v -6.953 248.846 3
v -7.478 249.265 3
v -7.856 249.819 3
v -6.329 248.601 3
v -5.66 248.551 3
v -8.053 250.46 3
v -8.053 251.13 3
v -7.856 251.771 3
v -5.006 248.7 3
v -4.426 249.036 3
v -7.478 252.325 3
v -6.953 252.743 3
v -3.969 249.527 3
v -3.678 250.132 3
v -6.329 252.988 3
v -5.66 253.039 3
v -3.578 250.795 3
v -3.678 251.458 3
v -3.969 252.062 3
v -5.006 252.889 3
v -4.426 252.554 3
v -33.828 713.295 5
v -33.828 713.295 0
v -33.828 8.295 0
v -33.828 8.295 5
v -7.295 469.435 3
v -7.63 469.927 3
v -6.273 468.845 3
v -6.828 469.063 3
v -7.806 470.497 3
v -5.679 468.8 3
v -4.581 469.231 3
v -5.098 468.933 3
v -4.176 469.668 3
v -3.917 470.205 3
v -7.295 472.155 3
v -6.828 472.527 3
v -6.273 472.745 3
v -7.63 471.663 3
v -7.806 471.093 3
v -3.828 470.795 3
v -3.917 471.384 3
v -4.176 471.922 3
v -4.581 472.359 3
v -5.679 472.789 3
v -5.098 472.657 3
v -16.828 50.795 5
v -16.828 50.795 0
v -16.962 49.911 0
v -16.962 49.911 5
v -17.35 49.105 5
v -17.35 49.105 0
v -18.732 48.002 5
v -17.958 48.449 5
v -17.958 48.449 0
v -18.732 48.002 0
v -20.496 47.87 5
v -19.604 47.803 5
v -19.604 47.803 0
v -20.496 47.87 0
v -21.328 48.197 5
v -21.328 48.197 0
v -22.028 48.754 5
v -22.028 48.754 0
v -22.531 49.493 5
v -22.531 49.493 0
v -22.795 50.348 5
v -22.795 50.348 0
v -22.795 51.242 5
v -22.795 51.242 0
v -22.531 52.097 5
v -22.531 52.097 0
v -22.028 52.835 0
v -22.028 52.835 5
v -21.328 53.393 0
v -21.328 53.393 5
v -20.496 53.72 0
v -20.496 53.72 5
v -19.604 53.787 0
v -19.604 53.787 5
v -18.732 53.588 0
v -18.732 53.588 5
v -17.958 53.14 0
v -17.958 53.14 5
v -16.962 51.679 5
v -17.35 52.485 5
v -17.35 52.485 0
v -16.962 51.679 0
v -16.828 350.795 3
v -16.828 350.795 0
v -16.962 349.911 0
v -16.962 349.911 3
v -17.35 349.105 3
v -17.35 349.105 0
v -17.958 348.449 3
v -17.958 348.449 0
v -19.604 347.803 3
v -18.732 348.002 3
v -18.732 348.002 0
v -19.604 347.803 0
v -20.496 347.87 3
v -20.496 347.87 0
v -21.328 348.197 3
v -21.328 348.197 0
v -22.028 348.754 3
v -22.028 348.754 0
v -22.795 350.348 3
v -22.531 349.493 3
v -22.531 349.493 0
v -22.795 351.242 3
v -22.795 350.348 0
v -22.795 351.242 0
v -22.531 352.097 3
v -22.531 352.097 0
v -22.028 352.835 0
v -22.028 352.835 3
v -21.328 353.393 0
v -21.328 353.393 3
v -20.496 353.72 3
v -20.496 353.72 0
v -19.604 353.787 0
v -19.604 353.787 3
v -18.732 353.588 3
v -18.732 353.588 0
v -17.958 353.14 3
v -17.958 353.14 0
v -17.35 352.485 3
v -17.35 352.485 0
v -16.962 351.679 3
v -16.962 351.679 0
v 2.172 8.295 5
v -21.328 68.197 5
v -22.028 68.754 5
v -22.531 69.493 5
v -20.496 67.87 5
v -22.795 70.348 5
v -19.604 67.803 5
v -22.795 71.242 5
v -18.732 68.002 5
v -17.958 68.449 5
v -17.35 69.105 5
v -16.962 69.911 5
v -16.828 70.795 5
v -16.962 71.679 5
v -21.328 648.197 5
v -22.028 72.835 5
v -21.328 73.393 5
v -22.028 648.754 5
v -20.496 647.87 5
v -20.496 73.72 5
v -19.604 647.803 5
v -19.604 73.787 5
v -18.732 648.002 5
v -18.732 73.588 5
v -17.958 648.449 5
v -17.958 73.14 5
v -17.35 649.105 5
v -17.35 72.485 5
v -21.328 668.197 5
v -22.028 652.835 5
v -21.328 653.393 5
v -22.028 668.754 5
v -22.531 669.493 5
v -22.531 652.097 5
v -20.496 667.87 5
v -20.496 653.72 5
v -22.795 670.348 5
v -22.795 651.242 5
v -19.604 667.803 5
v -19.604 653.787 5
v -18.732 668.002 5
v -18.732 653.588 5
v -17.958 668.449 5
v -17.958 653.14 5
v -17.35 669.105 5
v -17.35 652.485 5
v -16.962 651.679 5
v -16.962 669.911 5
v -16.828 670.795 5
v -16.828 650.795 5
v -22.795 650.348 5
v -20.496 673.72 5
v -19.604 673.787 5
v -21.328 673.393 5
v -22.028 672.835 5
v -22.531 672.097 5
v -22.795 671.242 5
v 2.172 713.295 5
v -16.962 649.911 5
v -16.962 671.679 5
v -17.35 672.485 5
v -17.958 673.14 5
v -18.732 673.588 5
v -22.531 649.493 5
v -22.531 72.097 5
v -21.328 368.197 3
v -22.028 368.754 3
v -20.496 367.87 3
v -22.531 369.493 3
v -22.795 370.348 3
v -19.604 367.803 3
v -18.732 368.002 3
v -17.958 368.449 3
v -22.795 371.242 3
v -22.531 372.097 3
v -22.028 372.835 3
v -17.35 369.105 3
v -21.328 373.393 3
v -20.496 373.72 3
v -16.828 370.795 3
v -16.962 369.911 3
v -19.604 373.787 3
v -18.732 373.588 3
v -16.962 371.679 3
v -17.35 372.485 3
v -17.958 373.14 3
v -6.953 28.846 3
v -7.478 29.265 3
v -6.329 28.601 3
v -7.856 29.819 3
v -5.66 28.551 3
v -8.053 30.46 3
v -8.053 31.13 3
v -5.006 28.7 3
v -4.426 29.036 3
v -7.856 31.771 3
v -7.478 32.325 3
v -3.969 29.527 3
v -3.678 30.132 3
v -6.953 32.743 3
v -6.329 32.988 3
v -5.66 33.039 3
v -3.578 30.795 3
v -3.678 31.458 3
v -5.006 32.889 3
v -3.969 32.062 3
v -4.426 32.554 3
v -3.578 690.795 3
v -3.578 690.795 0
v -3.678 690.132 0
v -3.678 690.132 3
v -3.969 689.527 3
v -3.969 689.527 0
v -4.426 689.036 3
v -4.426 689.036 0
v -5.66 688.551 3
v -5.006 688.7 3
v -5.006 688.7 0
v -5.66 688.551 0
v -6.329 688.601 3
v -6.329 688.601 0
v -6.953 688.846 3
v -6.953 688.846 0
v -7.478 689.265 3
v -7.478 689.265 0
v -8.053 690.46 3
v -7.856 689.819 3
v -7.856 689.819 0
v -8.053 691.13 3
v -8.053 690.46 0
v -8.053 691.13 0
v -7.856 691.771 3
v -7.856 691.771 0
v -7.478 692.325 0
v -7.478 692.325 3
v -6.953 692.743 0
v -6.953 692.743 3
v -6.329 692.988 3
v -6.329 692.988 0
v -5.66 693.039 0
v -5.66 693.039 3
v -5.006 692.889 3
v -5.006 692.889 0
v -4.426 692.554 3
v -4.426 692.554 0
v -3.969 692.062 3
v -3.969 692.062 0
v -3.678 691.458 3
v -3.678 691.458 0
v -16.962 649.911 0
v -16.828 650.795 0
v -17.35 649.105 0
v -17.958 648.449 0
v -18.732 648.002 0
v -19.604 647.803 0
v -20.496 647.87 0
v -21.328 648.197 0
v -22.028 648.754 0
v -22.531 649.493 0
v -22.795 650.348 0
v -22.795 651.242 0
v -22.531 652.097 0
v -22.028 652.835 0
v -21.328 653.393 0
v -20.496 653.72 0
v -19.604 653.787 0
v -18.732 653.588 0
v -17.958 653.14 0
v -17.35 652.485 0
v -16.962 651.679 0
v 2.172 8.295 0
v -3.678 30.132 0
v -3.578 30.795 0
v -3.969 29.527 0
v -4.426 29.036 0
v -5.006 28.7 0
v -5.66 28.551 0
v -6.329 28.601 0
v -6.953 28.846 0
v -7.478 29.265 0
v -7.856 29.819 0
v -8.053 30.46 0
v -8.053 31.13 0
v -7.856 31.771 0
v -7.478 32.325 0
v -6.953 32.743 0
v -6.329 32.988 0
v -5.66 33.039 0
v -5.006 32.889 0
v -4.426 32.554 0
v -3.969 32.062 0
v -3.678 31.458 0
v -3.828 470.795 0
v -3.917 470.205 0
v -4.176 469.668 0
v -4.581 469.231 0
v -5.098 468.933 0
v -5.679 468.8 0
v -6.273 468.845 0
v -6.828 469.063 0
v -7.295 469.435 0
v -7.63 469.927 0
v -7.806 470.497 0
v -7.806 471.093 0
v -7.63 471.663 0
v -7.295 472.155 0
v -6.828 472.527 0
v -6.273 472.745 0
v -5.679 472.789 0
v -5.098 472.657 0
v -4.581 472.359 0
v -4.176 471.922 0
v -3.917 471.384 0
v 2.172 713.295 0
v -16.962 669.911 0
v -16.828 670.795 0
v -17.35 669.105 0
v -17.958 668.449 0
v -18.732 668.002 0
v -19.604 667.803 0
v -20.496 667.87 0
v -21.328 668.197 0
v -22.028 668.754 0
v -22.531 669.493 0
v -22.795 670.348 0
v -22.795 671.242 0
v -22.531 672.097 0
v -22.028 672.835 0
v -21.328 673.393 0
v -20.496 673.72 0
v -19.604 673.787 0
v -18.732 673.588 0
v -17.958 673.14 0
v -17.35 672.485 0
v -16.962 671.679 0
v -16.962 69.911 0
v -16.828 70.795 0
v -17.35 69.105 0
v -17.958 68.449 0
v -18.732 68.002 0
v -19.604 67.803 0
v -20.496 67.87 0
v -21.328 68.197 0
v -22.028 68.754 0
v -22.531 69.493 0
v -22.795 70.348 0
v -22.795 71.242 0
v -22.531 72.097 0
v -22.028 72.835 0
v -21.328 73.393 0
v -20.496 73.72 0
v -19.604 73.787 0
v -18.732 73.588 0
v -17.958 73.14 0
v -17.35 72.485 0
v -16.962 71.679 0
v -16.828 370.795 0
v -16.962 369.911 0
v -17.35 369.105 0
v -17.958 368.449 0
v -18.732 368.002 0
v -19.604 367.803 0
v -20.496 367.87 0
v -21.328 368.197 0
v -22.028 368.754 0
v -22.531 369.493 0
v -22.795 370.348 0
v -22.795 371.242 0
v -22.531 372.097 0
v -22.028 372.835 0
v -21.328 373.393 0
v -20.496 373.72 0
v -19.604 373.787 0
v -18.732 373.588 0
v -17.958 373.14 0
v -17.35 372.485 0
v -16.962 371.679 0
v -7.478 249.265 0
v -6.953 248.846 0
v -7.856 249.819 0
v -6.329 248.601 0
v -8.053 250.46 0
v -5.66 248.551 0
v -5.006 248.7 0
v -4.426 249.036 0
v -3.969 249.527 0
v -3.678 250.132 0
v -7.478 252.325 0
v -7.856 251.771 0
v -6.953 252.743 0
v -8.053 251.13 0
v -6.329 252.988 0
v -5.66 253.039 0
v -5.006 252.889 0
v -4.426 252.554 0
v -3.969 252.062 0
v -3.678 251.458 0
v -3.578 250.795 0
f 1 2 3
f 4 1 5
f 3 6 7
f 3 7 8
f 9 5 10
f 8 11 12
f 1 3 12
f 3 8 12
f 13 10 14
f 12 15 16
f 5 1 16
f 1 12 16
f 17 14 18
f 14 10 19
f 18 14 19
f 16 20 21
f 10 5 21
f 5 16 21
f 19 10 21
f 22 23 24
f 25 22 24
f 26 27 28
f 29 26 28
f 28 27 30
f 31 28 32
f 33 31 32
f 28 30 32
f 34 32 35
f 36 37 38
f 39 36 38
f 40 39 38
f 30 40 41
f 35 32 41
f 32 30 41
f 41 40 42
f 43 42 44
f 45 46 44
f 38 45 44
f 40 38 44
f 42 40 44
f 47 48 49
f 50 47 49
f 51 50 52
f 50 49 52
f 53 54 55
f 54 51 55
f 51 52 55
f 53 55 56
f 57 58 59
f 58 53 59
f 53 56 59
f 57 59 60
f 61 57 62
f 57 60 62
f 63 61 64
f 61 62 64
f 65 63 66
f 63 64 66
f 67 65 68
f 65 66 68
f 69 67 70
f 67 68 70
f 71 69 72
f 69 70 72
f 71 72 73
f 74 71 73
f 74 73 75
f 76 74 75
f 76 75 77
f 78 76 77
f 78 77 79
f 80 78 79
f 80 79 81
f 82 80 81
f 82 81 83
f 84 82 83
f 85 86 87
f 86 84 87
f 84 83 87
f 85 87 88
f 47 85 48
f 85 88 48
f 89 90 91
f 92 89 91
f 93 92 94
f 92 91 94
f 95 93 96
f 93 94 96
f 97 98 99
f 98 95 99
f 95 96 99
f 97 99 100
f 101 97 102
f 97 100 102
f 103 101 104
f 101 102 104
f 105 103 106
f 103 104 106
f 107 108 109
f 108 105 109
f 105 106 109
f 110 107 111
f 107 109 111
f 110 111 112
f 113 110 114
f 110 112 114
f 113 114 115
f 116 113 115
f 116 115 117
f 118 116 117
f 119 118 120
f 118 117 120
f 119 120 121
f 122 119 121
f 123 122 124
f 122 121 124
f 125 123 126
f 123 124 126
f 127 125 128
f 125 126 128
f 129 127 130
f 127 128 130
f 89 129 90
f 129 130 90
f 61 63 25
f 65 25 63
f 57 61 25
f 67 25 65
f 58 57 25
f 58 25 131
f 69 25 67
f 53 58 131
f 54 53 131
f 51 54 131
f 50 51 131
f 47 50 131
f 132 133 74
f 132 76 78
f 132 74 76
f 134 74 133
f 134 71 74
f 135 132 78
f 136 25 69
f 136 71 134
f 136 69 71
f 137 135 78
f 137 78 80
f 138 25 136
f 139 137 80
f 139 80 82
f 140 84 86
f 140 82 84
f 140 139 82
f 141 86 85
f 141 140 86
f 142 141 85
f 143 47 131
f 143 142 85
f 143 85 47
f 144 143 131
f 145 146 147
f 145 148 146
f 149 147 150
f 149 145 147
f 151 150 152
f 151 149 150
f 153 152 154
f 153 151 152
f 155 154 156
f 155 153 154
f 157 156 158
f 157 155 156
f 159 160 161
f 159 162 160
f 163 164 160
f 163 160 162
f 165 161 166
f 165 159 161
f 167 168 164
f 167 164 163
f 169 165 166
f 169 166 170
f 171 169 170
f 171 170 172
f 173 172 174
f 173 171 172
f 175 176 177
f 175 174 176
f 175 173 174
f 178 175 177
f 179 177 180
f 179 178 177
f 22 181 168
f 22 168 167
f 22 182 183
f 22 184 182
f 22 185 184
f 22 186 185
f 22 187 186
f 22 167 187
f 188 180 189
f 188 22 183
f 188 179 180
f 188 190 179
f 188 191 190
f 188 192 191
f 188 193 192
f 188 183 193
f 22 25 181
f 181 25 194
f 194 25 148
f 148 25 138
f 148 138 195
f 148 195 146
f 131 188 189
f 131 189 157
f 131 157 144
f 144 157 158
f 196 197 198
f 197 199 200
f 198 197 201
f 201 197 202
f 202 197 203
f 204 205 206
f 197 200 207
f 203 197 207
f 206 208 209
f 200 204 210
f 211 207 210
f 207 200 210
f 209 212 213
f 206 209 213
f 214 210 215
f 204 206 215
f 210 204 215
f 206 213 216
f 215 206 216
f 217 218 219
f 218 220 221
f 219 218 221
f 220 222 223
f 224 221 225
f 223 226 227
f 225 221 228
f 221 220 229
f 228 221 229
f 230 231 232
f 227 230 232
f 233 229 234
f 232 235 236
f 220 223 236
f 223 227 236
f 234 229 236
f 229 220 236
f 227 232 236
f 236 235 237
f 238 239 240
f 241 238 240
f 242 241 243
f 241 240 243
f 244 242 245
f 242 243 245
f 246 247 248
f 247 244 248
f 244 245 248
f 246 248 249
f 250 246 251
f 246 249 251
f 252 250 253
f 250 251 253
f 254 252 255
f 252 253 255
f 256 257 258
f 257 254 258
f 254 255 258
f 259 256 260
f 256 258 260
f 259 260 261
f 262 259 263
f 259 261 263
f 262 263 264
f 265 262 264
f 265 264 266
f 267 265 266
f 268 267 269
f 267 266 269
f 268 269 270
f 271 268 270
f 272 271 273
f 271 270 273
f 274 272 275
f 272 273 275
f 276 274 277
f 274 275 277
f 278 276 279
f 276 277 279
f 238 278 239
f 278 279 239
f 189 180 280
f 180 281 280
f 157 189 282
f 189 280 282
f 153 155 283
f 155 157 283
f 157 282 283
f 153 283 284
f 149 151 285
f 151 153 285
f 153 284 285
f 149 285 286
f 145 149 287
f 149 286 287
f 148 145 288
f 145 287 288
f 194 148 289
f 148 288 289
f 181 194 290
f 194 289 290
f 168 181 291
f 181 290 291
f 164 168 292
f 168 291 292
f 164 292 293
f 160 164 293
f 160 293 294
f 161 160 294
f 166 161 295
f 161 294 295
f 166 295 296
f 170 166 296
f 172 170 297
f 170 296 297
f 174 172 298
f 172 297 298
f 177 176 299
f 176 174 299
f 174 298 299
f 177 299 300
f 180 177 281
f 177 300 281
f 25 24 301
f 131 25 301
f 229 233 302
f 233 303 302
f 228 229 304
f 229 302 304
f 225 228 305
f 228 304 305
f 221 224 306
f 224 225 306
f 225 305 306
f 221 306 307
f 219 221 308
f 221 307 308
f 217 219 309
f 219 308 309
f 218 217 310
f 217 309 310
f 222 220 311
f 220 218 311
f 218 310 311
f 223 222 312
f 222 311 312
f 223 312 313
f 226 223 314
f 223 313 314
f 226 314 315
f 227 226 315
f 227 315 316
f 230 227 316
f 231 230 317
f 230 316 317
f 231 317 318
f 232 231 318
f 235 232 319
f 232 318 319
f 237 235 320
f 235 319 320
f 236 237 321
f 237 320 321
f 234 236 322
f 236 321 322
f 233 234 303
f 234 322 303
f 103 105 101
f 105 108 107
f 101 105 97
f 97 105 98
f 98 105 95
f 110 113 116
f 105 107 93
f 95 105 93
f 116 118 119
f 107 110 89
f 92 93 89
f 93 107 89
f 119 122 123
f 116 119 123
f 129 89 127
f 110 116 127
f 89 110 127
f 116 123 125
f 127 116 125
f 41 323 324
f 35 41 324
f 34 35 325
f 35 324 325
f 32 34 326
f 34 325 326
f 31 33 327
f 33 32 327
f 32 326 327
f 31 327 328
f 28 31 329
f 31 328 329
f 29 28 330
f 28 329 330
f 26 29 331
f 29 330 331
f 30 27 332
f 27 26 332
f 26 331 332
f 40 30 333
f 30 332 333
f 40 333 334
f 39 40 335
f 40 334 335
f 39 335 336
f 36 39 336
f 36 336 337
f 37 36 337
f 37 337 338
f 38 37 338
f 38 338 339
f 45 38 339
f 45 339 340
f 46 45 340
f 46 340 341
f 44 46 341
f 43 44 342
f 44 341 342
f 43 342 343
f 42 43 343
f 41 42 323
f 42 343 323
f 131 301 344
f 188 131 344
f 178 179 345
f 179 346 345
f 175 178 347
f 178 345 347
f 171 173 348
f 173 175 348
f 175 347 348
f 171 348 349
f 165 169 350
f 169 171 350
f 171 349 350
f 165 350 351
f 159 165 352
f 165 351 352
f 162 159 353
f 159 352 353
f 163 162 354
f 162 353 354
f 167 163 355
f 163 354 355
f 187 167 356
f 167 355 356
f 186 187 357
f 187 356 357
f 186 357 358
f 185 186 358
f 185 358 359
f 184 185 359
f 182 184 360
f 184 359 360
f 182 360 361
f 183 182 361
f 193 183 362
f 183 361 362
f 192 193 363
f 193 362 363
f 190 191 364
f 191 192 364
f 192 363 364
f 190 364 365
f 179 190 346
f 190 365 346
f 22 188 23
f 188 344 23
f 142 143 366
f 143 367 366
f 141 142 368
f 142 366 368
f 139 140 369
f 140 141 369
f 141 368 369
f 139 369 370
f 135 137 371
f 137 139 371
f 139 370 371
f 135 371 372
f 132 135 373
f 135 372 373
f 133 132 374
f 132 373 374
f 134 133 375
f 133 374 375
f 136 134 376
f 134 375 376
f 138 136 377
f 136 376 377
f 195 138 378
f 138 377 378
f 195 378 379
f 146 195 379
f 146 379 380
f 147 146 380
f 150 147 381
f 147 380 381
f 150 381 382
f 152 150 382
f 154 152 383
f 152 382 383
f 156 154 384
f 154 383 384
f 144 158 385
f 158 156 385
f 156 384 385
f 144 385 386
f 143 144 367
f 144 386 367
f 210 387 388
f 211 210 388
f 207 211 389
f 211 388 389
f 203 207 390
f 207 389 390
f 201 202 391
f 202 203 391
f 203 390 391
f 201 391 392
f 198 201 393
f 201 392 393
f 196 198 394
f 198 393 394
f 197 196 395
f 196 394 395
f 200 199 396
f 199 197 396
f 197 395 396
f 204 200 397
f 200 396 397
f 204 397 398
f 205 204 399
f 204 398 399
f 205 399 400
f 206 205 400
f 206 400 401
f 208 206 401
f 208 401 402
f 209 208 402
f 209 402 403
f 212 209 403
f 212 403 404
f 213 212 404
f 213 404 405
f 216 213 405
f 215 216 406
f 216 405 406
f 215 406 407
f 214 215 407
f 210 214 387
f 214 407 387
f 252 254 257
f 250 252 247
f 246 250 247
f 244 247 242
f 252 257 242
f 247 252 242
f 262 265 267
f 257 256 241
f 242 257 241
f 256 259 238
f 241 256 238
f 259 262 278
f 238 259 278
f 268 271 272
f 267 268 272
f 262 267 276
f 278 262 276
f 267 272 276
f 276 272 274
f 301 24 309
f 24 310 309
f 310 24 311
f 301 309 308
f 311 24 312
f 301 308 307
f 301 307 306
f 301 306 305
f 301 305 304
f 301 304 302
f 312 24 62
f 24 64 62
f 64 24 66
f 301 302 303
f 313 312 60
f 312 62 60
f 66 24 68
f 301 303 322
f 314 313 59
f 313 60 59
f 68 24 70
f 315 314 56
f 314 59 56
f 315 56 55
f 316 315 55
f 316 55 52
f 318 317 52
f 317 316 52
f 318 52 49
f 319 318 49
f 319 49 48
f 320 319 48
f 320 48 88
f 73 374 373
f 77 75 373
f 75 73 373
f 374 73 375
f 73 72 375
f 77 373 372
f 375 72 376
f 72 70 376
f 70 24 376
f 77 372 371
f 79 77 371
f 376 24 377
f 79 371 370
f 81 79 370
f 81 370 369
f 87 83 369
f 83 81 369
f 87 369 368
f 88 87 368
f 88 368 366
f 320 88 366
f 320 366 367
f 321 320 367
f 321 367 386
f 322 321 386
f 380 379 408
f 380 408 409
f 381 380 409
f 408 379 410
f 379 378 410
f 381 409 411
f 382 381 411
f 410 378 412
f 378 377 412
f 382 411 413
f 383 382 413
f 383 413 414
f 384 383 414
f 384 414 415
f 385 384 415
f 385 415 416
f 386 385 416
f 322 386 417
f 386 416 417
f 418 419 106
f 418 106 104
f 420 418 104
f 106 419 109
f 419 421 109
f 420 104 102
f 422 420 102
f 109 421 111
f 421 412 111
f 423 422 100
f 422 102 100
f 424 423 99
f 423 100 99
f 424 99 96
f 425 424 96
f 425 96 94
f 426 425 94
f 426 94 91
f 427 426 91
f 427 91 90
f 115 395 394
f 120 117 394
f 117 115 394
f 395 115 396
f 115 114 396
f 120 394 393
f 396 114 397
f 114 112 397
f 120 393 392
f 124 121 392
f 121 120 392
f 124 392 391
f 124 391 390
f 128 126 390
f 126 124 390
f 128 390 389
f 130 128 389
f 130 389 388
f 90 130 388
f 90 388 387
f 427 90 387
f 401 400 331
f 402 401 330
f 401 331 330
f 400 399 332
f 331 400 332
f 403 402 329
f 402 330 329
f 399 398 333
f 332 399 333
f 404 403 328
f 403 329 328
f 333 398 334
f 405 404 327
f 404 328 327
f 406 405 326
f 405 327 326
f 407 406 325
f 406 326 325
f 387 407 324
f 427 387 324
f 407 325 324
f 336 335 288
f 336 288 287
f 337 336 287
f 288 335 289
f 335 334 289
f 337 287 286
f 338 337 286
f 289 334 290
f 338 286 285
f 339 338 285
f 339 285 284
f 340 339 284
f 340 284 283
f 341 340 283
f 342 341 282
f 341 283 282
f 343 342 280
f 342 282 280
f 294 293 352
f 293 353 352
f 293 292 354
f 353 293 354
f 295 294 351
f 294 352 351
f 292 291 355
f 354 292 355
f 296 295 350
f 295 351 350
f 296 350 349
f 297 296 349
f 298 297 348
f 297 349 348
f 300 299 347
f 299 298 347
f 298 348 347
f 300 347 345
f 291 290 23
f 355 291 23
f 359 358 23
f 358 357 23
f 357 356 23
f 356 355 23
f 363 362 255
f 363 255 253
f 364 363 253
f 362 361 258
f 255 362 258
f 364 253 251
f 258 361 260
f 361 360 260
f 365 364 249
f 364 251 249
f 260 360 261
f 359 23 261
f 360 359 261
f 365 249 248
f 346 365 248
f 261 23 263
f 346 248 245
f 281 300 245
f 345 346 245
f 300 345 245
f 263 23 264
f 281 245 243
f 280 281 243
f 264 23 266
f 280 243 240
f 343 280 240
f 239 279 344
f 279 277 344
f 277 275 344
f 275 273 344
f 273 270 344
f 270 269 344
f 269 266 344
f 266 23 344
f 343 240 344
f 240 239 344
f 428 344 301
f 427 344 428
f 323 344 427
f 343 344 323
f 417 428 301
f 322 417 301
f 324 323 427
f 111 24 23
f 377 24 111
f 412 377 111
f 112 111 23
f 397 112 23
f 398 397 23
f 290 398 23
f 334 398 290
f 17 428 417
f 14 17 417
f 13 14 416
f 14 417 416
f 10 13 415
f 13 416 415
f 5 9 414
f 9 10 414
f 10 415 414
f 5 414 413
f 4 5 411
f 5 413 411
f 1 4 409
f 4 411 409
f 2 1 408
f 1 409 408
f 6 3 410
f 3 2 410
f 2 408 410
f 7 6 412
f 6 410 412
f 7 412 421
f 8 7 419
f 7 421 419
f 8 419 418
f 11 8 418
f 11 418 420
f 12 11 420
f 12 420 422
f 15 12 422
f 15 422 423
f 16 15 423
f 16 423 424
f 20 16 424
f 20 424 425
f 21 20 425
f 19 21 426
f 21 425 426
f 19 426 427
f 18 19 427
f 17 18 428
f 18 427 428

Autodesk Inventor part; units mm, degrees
ref_plane "YZ Plane" through (0, 0, 0) normal (1, 0, 0) x (0, 1, 0)
ref_plane "XZ Plane" through (0, 0, 0) normal (0, 1, 0) x (-1, 0, 0)
ref_plane "XY Plane" through (0, 0, 0) normal (0, 0, 1) x (1, 0, 0)
sketch "Sketch1" plane through (0, 0, 0) normal (0, 0, 1) x (1, 0, 0)
  line L0 (-33.8284, 8.2949) -> (2.1716, 8.2949)
  line L1 (2.1716, 8.2949) -> (2.1716, 713.2949)
  line L2 (2.1716, 713.2949) -> (-33.8284, 713.2949)
  line L3 (-33.8284, 713.2949) -> (-33.8284, 8.2949)
  circle A0 centre (-19.8284, 670.7949) radius 3
  circle A1 centre (-19.8284, 650.7949) radius 3
  circle A2 centre (-19.8284, 70.7949) radius 3
  circle A3 centre (-19.8284, 50.7949) radius 3
  circle A4 centre (-19.8284, 370.7949) radius 3
  circle A5 centre (-19.8284, 350.7949) radius 3
  circle A6 centre (-5.8284, 250.7949) radius 2.25
  circle A7 centre (-5.8284, 30.7949) radius 2.25
  circle A8 centre (-5.8284, 690.7949) radius 2.25
  circle A9 centre (-5.8284, 470.7949) radius 2
  point P0 (0, 0)
  dimension "d0" = 36
  dimension "d1" = 705
  dimension "d2" = 6
  dimension "d3" = 6
  dimension "d4" = 20
  dimension "d5" = 6
  dimension "d6" = 6
  dimension "d7" = 20
  dimension "d8" = 600
  dimension "d9" = 42.5
  dimension "d10" = 14
  dimension "d13" = 6
  dimension "d14" = 6
  dimension "d15" = 20
  dimension "d16" = 300
  dimension "d21" = 4.5
  dimension "d22" = 4.5
  dimension "d23" = 4.5
  dimension "d24" = 4
  dimension "d25" = 8
  dimension "d26" = 220
  dimension "d27" = 220
  dimension "d28" = 220
  dimension "d29" = 22.5
extrude "Extrusion1" add sketch "Sketch1" along normal blind 5 contours L3 L2 L1 L0 | A4 | A5 | A6 | A7 | A8 | A9
extrude "Extrusion2" cut sketch "Sketch1" along normal blind 3 contours A5
extrude "Extrusion3" cut sketch "Sketch1" along normal blind 3 contours A4
extrude "Extrusion4" cut sketch "Sketch1" along normal blind 3 contours A6 | A7 | A8 | A9
equation "\"d27\" = d26"
equation "\"d28\" = d26"
properties part number "TuerHalter" material "Polycarbonate, Clear"
